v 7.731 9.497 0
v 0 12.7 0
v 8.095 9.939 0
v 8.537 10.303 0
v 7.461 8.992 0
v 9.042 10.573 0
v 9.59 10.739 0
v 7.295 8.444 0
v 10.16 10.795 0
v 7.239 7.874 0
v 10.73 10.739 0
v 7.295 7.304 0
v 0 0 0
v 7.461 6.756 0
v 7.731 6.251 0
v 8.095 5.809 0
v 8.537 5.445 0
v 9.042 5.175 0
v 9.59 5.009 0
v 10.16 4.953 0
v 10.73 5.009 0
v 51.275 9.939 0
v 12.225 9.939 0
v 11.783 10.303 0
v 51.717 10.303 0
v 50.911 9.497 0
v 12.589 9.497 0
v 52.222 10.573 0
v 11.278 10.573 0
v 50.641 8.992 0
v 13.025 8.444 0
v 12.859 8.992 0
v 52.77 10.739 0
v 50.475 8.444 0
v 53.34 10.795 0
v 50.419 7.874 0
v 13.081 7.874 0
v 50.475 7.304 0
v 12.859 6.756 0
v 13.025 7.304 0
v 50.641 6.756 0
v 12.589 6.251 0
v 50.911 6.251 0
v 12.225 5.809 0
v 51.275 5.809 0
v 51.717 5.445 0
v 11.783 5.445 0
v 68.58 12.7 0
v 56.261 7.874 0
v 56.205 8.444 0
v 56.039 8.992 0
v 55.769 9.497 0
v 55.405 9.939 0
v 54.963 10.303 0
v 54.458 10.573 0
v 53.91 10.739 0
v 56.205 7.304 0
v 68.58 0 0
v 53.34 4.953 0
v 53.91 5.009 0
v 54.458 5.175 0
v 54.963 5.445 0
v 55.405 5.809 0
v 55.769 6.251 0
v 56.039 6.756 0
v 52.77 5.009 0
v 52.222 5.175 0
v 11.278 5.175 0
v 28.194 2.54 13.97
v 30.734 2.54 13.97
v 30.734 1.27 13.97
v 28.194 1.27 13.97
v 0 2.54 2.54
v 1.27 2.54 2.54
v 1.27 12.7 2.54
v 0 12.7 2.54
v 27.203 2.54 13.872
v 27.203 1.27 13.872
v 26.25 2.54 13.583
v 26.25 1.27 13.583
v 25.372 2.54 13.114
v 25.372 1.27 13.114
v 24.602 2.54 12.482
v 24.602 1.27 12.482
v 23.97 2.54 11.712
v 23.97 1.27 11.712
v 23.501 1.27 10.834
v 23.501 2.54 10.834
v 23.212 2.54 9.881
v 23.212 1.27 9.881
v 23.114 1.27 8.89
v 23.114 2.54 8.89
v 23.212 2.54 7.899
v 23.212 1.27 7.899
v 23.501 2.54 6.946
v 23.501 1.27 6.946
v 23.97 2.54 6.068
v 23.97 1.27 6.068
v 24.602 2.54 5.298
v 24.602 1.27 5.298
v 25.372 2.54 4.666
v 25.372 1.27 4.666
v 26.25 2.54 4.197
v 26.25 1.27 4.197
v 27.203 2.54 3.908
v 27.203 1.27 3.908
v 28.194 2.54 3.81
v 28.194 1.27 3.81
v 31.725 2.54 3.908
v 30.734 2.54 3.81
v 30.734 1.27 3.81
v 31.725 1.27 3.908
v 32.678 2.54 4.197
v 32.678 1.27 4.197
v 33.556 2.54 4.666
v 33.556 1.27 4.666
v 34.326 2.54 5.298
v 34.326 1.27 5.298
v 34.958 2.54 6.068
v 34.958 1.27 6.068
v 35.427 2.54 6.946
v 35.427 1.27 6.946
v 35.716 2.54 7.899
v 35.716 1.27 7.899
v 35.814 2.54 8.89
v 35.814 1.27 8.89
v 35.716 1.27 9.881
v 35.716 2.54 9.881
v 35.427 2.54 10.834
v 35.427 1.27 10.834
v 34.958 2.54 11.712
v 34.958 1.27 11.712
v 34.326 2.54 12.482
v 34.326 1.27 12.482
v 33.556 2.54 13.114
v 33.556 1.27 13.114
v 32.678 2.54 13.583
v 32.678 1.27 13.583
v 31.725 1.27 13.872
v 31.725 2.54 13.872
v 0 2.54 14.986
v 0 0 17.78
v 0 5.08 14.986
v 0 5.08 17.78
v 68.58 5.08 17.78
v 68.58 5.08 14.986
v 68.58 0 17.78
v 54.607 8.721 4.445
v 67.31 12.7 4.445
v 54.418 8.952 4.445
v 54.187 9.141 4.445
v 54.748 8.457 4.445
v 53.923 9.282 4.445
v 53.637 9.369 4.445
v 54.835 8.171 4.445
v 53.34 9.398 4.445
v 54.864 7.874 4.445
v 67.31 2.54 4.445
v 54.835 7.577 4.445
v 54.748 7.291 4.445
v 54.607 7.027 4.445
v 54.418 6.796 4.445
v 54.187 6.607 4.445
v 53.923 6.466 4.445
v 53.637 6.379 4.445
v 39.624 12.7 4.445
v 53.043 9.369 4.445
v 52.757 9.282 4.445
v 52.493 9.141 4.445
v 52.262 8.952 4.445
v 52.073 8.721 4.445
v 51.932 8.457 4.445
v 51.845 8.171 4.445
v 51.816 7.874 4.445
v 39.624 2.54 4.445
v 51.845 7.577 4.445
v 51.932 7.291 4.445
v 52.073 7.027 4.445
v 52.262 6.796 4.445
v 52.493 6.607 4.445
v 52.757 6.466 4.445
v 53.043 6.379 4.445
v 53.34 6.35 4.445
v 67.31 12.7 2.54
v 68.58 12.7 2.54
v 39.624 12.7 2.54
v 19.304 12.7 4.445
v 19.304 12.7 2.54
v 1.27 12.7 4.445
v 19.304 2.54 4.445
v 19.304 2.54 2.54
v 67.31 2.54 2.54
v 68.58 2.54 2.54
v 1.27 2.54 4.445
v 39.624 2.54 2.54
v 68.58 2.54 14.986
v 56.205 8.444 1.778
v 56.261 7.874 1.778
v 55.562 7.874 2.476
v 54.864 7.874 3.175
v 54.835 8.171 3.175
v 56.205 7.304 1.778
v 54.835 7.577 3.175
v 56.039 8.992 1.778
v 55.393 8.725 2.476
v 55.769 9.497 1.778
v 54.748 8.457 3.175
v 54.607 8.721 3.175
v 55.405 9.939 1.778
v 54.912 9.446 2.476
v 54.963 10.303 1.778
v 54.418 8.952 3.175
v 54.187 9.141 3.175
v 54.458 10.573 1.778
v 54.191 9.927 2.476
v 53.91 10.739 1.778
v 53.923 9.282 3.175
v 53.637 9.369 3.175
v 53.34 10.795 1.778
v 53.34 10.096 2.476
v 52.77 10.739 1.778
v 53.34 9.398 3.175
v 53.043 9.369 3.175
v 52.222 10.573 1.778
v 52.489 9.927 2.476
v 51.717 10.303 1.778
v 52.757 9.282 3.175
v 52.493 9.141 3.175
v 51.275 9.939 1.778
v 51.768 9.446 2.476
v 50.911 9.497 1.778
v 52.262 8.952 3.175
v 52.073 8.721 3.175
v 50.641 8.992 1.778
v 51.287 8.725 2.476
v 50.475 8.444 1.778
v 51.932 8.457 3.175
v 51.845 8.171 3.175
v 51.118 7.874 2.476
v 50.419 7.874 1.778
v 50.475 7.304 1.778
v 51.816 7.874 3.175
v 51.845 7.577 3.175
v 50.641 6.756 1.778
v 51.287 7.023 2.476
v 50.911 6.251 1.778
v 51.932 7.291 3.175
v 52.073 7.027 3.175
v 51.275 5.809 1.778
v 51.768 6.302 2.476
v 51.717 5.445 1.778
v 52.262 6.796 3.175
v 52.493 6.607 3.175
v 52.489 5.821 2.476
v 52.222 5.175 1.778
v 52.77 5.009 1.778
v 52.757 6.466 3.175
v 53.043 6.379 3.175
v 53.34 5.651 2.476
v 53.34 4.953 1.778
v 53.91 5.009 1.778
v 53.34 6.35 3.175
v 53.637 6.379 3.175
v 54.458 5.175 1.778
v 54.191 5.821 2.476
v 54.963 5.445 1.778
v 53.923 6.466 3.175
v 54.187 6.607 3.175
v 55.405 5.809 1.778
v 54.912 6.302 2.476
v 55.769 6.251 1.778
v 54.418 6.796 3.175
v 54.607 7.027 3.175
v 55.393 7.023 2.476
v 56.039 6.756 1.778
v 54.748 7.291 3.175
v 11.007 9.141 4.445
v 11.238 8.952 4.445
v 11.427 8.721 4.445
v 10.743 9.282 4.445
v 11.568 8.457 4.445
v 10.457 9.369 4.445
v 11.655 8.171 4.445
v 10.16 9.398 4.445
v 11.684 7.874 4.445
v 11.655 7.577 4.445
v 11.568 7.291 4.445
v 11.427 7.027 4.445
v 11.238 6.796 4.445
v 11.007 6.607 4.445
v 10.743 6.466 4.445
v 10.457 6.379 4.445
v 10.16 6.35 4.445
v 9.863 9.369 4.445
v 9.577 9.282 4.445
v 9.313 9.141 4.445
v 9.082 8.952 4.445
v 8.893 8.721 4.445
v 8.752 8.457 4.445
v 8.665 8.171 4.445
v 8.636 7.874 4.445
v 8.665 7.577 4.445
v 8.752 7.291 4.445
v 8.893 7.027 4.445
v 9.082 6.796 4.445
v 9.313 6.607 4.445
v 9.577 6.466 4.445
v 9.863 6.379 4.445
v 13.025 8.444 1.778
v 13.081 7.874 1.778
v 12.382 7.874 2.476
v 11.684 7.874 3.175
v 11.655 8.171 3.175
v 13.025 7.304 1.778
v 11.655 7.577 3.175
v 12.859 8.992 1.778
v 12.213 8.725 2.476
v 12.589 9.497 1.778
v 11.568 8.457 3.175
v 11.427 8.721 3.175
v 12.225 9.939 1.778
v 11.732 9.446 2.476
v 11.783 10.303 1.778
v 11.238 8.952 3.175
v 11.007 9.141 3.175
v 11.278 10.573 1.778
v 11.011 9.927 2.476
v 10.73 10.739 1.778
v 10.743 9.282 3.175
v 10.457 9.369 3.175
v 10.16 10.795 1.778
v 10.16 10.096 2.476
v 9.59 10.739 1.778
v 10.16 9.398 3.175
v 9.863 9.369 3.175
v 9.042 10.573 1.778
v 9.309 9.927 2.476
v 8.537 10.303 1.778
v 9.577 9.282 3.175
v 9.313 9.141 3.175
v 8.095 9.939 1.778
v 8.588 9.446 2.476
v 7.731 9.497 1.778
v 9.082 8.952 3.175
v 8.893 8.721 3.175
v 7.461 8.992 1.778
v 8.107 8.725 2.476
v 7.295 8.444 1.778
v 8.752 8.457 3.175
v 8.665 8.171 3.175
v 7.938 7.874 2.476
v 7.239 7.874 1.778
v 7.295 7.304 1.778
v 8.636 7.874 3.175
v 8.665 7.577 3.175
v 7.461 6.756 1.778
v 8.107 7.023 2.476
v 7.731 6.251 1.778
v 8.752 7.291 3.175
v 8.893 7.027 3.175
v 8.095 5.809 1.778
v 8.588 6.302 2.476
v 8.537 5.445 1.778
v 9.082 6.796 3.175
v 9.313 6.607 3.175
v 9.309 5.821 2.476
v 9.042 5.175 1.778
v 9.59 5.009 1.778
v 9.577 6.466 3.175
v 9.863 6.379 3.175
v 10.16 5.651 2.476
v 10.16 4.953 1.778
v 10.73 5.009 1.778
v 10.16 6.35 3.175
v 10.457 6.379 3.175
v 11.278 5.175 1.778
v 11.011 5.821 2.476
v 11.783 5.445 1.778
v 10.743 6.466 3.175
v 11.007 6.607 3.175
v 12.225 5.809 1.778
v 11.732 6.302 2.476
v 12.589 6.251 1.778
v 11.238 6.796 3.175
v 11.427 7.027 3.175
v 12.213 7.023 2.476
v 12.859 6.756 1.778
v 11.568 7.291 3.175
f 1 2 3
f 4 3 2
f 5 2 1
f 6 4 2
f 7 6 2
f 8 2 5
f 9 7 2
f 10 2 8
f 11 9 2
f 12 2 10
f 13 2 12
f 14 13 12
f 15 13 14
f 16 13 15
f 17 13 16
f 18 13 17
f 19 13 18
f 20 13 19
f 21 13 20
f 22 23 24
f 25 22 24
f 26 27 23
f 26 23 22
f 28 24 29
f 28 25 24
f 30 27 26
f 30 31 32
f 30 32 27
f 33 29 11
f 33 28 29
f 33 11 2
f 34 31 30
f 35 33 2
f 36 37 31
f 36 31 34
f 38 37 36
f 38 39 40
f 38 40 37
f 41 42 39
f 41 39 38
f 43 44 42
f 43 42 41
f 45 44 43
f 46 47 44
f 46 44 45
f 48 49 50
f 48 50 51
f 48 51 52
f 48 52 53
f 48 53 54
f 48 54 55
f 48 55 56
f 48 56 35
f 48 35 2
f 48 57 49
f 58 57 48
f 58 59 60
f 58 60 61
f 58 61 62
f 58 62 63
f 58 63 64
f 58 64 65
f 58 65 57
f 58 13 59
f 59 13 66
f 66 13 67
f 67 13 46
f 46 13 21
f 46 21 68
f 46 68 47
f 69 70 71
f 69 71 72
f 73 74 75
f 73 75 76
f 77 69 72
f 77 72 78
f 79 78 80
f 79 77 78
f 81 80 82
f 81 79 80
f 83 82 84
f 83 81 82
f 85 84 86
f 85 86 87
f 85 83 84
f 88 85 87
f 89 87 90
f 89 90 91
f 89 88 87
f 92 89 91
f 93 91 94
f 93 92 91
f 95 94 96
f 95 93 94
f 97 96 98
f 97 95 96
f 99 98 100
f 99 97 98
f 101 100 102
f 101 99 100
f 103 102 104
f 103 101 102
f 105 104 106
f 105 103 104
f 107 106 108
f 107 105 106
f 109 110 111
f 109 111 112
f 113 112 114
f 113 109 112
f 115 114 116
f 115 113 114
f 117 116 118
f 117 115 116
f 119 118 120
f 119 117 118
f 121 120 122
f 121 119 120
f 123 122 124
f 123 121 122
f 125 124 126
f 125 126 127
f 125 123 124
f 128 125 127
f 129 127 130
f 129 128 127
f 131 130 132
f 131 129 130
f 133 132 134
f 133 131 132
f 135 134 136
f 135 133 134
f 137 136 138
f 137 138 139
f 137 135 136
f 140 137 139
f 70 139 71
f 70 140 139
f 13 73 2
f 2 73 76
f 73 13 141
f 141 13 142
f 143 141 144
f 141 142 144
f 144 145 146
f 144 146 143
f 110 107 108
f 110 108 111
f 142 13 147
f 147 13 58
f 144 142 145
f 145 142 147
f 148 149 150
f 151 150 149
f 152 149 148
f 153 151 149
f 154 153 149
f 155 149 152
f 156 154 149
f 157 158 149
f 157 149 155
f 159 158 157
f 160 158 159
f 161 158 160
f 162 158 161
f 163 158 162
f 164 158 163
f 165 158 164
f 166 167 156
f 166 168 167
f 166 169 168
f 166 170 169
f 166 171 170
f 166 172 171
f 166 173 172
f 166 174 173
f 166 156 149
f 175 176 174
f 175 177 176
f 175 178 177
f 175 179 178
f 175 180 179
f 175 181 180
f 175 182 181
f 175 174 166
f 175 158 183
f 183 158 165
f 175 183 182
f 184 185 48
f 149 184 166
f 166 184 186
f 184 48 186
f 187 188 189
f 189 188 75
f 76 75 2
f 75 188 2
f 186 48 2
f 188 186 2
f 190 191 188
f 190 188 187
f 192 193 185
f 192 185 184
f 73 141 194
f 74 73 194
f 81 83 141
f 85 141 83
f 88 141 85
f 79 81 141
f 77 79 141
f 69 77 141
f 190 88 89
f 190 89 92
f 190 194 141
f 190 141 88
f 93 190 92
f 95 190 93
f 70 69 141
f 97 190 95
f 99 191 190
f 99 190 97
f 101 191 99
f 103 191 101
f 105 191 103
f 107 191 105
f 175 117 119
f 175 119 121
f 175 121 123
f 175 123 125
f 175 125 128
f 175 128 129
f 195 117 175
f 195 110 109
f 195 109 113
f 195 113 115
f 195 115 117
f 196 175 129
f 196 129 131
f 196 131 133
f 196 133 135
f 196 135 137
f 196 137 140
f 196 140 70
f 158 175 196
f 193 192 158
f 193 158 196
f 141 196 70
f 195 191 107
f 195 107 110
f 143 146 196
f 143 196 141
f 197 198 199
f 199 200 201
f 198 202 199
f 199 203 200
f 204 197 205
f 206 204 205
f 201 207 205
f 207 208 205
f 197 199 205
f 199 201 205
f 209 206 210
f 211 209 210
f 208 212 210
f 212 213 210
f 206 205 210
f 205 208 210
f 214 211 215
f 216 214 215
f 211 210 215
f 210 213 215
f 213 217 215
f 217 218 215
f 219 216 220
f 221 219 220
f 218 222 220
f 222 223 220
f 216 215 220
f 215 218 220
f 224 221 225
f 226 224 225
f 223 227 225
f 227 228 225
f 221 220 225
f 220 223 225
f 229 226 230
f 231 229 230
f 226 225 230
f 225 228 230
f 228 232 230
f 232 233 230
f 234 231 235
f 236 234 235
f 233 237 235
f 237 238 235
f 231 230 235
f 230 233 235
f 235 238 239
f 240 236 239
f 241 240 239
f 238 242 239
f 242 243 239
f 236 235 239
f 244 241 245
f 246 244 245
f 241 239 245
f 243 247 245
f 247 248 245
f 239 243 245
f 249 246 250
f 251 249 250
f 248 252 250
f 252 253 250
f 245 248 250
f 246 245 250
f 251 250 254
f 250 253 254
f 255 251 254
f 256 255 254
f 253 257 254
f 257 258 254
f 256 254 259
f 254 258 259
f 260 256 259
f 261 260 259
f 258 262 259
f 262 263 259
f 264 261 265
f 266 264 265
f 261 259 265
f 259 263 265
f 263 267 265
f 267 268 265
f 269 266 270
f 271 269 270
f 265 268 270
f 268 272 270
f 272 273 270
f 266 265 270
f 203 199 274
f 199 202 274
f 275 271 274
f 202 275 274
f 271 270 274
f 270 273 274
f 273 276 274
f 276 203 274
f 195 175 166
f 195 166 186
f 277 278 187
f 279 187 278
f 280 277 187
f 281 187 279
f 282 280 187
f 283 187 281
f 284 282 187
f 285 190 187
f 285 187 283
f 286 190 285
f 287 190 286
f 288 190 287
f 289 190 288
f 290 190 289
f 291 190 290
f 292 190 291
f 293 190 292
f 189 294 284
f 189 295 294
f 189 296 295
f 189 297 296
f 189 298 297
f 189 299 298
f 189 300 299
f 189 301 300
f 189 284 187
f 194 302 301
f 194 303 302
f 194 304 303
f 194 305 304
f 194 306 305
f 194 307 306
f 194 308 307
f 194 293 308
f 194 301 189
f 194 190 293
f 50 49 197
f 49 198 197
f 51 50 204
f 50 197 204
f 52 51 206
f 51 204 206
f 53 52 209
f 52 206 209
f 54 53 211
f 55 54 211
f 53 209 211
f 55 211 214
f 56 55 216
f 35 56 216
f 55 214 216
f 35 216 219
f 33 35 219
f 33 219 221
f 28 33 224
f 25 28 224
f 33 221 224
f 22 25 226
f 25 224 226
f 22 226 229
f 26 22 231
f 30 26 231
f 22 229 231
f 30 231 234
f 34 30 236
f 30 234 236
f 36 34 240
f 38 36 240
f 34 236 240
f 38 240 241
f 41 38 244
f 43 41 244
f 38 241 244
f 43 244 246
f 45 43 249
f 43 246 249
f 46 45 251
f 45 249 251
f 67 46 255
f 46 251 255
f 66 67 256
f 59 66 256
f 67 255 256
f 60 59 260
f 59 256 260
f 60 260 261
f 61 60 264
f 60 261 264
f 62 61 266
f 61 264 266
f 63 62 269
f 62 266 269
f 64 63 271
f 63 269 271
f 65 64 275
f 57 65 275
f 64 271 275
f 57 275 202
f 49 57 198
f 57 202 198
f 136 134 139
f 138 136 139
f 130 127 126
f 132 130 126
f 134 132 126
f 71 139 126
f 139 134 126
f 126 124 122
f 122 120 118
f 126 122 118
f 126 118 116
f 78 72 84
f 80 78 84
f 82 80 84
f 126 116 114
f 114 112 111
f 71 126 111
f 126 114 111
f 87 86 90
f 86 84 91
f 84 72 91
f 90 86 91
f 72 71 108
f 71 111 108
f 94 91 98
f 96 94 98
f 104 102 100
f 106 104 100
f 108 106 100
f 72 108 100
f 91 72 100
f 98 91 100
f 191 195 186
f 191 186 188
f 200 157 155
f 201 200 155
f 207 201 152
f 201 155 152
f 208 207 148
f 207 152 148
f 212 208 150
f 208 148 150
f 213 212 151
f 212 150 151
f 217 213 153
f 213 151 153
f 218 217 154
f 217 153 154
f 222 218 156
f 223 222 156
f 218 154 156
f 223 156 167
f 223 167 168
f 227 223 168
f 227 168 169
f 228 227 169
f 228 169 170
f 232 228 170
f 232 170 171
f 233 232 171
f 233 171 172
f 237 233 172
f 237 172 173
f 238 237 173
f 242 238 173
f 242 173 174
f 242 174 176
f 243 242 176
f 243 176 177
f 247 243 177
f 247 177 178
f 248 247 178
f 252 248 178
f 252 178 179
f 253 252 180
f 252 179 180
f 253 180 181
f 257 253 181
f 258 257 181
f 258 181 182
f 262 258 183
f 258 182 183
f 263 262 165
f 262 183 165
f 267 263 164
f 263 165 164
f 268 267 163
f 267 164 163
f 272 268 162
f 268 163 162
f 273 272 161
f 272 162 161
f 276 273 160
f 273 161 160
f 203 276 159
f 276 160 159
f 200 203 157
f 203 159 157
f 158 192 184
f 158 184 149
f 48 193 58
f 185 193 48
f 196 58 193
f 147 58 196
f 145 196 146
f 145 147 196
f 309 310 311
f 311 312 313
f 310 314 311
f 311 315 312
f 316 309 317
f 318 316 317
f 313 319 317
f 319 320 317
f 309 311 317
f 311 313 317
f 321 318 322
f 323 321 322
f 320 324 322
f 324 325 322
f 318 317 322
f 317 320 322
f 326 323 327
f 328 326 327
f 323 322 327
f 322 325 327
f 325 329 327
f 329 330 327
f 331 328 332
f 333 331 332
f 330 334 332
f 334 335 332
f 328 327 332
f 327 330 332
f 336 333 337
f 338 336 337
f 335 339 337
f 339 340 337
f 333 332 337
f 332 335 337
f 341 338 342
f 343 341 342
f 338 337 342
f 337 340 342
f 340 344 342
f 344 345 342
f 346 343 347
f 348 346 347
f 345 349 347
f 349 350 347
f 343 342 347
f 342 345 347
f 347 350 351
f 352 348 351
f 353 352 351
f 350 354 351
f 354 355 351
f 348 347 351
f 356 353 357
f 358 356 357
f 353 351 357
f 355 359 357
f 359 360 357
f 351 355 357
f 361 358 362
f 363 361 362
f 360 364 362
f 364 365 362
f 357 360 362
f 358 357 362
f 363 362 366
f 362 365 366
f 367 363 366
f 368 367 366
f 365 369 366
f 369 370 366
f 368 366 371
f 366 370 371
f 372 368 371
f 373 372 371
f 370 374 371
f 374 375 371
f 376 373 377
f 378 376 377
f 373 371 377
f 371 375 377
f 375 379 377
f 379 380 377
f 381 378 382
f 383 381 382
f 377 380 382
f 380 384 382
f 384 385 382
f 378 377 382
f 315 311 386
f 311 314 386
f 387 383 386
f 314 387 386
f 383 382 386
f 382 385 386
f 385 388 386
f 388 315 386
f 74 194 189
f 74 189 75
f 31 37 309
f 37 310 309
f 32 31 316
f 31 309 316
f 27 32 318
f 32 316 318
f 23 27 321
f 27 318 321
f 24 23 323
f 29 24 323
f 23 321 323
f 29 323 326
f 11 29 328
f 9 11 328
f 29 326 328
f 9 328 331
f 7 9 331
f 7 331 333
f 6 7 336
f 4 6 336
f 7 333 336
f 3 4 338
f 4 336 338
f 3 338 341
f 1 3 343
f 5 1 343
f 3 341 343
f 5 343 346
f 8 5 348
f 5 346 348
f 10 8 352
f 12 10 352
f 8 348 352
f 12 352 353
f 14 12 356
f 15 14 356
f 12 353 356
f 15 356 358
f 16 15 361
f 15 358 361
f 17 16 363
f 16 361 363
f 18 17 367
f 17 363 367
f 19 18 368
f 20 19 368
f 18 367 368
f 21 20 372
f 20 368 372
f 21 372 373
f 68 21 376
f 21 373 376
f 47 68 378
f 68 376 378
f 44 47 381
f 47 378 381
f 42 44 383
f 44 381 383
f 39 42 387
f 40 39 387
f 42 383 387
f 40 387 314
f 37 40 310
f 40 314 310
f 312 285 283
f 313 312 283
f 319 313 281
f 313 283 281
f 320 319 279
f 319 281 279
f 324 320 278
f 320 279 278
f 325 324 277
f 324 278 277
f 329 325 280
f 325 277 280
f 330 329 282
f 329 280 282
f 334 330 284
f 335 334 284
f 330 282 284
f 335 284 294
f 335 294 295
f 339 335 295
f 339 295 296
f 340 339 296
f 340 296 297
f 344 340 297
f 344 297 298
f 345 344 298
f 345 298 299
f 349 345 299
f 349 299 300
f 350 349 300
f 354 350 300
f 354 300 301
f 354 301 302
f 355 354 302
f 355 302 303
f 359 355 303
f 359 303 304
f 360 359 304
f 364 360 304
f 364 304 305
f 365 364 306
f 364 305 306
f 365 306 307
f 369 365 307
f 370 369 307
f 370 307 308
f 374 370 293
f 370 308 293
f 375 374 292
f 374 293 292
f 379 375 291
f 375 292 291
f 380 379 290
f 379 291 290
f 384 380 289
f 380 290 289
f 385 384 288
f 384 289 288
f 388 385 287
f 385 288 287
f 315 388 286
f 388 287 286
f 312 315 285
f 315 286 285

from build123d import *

# Parameters (mm, degrees)
SKETCH2_W                           = 68.58
SKETCH2_H                           = 17.78
BOSS_EXTRUDE1_DEPTH                 = 2.54
SKETCH3_W                           = 68.58
SKETCH3_H                           = 2.54
BOSS_EXTRUDE2_DEPTH                 = 2.54
BOSS_EXTRUDE3_DEPTH                 = 10.16
SKETCH5_R                           = 1.524
CUT_EXTRUDE1_DEPTH                  = 72.009355898
CUT_EXTRUDE2_START                  = -3.81
SKETCH6_R                           = 2.921
CUT_EXTRUDE2_DEPTH                  = 68.199355898
CHAMFER1_SIZE                       = 2.54
CUT_EXTRUDE3_DEPTH                  = 1.27
SKETCH8_W                           = 68.58
SKETCH8_H                           = 2.54
EXTRA_WIDTH_FOR_MIRRORED_PART_DEPTH = 0.254


with BuildPart() as part:
    # Sketch2 → Boss-Extrude1 (new body)
    with BuildSketch(Plane(origin=(0, 0, 0), x_dir=(1, 0, 0), z_dir=(0, 1, 0))):
        with Locations((34.29, -8.89)):
            Rectangle(SKETCH2_W, SKETCH2_H)
    extrude(amount=BOSS_EXTRUDE1_DEPTH)

    # Sketch3 → Boss-Extrude2 (add)
    with BuildSketch(Plane(origin=(0, 2.54, 0), x_dir=(1, 0, 0), z_dir=(0, 1, 0))):
        with Locations((34.29, -16.51)):
            Rectangle(SKETCH3_W, SKETCH3_H)
    extrude(amount=BOSS_EXTRUDE2_DEPTH)

    # Sketch4 → Boss-Extrude3 (add)
    with BuildSketch(Plane(origin=(0, 2.54, 0), x_dir=(1, 0, 0), z_dir=(0, 1, 0))):
        Polygon((0, 0), (68.58, 0), (68.58, -2.54), (67.31, -2.54), (67.31, -4.445), (39.624, -4.445), (39.624, -2.54), (19.304, -2.54), (19.304, -4.445), (1.27, -4.445), (1.27, -2.54), (0, -2.54), align=None)
    extrude(amount=BOSS_EXTRUDE3_DEPTH)

    # Sketch5 → Cut-Extrude1 (cut, through all)
    with BuildSketch(Plane.XY.offset(4.445)):
        with Locations((10.16, 7.874)):
            Circle(SKETCH5_R)
        with Locations((53.34, 7.874)):
            Circle(SKETCH5_R)
    extrude(amount=-CUT_EXTRUDE1_DEPTH, mode=Mode.SUBTRACT)

    # Sketch6 → Cut-Extrude2 (cut, through all)
    with BuildSketch(Plane.XY.offset(4.445).offset(CUT_EXTRUDE2_START)):
        with Locations((10.16, 7.874)):
            Circle(SKETCH6_R)
        with Locations((53.34, 7.874)):
            Circle(SKETCH6_R)
    extrude(amount=-CUT_EXTRUDE2_DEPTH, mode=Mode.SUBTRACT)

    # Chamfer1
    # the kernel refuses this chamfer: 2.54 mm, written as the material it takes off along each edge
    with BuildSketch(Plane(origin=(53.34, 7.874, 0.635), x_dir=(1, 0, 0), z_dir=(0, -1, 0))) as chamfer1_piece_1_section:
        Polygon((1.524 + CHAMFER1_SIZE, 0), (1.524, CHAMFER1_SIZE), (1.524, 0), align=None)
    chamfer1_piece_1 = revolve(axis=Axis((53.34, 7.874, 0.635), (0, 0, 1)), mode=Mode.PRIVATE)
    chamfer1_piece_1 = chamfer1_piece_1 & Plane(origin=(53.34, 7.874, 2.488878995), x_dir=(1, 0, 0), z_dir=(0, 0, 1)) * Cylinder(2.921, 17, mode=Mode.PRIVATE)
    add(chamfer1_piece_1, mode=Mode.SUBTRACT)
    with BuildSketch(Plane(origin=(10.16, 7.874, 0.635), x_dir=(1, 0, 0), z_dir=(0, -1, 0))) as chamfer1_piece_2_section:
        Polygon((1.524 + CHAMFER1_SIZE, 0), (1.524, CHAMFER1_SIZE), (1.524, 0), align=None)
    chamfer1_piece_2 = revolve(axis=Axis((10.16, 7.874, 0.635), (0, 0, 1)), mode=Mode.PRIVATE)
    chamfer1_piece_2 = chamfer1_piece_2 & Plane(origin=(10.16, 7.874, 2.488878995), x_dir=(1, 0, 0), z_dir=(0, 0, 1)) * Cylinder(2.921, 17, mode=Mode.PRIVATE)
    add(chamfer1_piece_2, mode=Mode.SUBTRACT)

    # Sketch7 → Cut-Extrude3 (cut)
    with BuildSketch(Plane(origin=(0, 2.54, 0), x_dir=(1, 0, 0), z_dir=(0, 1, 0))):
        with BuildLine():
            Line((28.194, -3.81), (30.734, -3.81))
            ThreePointArc((30.734, -3.81), (35.814, -8.89), (30.734, -13.97))
            Line((30.734, -13.97), (28.194, -13.97))
            ThreePointArc((28.194, -13.97), (23.114, -8.89), (28.194, -3.81))
        make_face()
    extrude(amount=-CUT_EXTRUDE3_DEPTH, mode=Mode.SUBTRACT)

    # Sketch8 → Extra_width_for_mirrored_part (add)
    with BuildSketch(Plane(origin=(0, 0, 15.24), x_dir=(-1, 0, 0), z_dir=(0, 0, -1))):
        with Locations((-34.29, 3.81)):
            Rectangle(SKETCH8_W, SKETCH8_H)
    extrude(amount=EXTRA_WIDTH_FOR_MIRRORED_PART_DEPTH)


solid = part.part
